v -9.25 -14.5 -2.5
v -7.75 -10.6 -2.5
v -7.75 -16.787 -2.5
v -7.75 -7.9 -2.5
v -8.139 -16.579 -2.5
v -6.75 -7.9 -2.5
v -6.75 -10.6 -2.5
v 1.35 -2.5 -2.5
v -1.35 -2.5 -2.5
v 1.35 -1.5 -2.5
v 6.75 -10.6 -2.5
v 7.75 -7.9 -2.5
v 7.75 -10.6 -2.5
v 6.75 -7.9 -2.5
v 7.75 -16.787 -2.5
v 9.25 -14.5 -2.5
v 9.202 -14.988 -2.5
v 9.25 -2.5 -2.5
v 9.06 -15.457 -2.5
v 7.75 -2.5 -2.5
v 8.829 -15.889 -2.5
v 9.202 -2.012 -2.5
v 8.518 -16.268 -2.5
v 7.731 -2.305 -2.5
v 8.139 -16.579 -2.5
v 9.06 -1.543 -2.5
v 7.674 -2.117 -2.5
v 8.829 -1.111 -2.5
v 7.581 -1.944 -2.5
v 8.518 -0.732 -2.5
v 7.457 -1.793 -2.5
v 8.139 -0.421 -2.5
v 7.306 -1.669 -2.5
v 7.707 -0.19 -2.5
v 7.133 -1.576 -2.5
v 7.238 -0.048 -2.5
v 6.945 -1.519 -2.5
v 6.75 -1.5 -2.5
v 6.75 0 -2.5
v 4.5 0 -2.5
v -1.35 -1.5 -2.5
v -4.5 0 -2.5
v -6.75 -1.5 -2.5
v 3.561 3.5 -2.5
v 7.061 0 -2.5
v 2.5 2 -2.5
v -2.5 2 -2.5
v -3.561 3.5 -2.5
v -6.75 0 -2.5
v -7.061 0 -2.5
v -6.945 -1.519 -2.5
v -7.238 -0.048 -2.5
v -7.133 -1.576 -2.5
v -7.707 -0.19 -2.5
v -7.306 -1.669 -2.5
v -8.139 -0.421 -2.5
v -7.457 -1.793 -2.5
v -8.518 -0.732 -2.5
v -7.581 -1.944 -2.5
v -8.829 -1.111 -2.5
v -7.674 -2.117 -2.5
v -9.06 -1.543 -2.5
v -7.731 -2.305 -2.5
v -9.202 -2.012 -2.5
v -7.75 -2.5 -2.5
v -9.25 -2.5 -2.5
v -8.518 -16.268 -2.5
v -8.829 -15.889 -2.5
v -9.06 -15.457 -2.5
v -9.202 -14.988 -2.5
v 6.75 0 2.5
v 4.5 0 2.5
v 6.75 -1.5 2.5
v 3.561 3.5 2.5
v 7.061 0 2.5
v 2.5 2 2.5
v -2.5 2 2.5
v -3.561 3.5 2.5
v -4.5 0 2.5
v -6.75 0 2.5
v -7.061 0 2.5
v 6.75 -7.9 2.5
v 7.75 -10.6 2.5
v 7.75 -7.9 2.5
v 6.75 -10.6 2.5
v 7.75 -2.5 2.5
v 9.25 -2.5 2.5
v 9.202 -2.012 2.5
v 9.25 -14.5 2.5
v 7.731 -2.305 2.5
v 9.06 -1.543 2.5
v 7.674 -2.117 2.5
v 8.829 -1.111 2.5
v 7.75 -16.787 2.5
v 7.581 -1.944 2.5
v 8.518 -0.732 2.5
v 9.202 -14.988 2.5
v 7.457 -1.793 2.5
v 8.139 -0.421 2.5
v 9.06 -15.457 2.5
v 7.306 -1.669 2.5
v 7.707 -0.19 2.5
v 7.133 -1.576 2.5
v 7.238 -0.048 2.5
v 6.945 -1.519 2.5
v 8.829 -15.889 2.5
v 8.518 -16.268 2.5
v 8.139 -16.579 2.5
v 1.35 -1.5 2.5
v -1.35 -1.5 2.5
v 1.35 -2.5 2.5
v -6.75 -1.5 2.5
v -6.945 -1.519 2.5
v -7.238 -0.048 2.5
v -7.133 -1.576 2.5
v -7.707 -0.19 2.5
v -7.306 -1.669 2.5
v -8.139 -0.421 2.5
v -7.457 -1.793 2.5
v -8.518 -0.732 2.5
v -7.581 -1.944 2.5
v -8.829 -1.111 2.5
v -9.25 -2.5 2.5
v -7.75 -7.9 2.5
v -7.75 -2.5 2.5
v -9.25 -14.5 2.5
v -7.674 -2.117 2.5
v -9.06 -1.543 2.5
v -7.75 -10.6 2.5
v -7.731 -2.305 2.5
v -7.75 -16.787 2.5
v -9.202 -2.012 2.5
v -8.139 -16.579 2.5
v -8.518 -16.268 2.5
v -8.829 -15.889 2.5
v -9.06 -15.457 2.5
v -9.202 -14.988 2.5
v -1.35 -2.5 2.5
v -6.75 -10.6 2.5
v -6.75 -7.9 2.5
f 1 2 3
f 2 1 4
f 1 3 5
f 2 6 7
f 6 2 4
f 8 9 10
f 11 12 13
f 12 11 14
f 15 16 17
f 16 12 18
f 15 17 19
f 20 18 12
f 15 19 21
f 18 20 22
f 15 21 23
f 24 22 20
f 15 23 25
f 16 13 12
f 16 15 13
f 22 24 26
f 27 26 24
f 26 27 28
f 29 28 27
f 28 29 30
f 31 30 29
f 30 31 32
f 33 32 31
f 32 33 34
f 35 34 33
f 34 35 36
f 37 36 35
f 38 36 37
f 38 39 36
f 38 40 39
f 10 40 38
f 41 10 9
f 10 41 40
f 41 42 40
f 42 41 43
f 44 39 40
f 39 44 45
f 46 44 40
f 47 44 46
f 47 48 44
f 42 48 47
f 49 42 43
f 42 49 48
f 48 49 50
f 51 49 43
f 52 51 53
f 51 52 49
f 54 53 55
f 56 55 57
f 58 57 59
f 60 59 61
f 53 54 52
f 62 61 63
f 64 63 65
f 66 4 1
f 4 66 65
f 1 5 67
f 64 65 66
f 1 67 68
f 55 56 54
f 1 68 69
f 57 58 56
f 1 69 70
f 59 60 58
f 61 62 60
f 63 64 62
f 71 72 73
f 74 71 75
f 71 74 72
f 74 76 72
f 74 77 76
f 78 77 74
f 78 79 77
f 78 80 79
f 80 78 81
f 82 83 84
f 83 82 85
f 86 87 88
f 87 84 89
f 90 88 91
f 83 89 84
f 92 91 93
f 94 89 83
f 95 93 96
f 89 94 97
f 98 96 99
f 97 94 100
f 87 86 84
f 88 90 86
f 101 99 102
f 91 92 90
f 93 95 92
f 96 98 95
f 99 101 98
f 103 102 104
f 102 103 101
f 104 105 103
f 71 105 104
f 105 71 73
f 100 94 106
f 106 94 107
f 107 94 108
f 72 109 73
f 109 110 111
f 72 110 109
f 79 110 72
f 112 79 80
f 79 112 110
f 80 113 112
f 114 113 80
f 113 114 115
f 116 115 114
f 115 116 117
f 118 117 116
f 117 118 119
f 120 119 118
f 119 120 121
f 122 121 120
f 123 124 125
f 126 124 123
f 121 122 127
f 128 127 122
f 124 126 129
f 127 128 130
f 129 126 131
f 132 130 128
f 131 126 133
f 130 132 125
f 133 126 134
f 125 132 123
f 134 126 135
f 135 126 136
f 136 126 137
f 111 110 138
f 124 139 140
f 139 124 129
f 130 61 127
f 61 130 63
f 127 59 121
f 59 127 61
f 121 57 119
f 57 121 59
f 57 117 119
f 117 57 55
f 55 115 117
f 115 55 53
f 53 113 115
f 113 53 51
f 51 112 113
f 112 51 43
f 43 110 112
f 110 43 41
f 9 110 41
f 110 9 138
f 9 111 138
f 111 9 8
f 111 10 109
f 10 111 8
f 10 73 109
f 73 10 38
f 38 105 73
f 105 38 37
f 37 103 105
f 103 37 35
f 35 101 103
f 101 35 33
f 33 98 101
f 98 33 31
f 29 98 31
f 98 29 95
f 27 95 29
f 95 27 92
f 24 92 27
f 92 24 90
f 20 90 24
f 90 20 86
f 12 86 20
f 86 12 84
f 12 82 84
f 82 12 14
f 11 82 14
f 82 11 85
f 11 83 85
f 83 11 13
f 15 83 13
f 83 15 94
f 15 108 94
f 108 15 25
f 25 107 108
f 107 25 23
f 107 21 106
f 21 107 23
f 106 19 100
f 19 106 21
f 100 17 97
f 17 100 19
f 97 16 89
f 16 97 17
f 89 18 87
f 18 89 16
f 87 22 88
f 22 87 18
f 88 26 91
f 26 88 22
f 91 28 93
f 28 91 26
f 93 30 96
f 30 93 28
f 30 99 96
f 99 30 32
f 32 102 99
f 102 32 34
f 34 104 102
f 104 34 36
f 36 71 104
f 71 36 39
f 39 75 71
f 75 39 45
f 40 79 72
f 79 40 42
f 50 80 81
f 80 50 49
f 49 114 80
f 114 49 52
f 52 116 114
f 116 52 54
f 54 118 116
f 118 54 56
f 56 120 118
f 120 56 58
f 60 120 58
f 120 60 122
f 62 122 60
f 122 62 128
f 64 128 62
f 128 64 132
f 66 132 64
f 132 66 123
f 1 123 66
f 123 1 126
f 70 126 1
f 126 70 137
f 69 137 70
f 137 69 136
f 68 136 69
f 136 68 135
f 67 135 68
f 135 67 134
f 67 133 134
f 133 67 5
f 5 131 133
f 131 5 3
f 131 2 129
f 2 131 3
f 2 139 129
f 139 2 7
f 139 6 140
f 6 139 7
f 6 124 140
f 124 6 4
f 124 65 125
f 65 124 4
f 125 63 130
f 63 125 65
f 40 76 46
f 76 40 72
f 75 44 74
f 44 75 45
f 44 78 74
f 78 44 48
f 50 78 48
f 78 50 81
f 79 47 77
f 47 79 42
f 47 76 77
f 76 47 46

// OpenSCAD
// file: isosceles_trapezoid.scad
module isosceles_trapezoid(d = 5, angle = 45, h = 1, height = 1) {
	bevel_width = h/tan(angle);
	base_width = d + 2*bevel_width;
	scale_x = base_width/d;

	// turn back into 2D primitive
	projection()
		// turn flat on x plane
		rotate([90, 0, 0])
			// move back into center
			translate([0, 0, -h/2])
				// extrude with scaling into trapezoid
				linear_extrude(height = h, scale=[scale_x, 1])
					square([d, 1], center = true);
}

isosceles_trapezoid();
// file: tie_clip_holder.scad
use <isosceles_trapezoid.scad>;

// derive bevel width from thickness so that actual bevel thickness equals
// thickness
function tie_clip_holder_outer_length(clip_width, angle, thickness) =
	let(bevel_width = sin(angle)*thickness)
	clip_width + 2*bevel_width;

function tie_clip_holder_outer_height(clip_height, thickness) =
	clip_height + thickness;

// allow users to query the base width of the holder so they know what room
// they must make for attaching it somewhere
function tie_clip_holder_base_length(clip_width, clip_height, angle, thickness) =
	let(bevel_width = tie_clip_holder_outer_height(clip_height, thickness)/tan(angle))
	tie_clip_holder_outer_length(clip_width, angle, thickness) + 2*bevel_width;

module tie_clip_holder(holder_width = 5,
		clip_width = 5, clip_height = 2, thickness = 1.5, angle = 45) {
	outer_height = tie_clip_holder_outer_height(clip_height, thickness);

	// move to a zero line in y direction and otherwise in center
	// so we can put it on top of other stuff
	translate([0, outer_height/2, -holder_width/2])
		linear_extrude(holder_width)
			difference() {
				outer_length = tie_clip_holder_outer_length(clip_width,
					angle, thickness);

				// beveled for more technical look and better
				// overhang printing
				isosceles_trapezoid(d = outer_length, h = outer_height,
					angle = angle);
				translate([0, -thickness/2, 0])
					isosceles_trapezoid(d = clip_width,
						h = clip_height, angle = angle);

			}
}

tie_clip_holder();
// file: openbeam_clip.scad
$fn = 32;

module rounded_rectangle(width = 1, height = 1, rounding = 0) {
	if (rounding > 0) {
		non_rounded_width = width - 2*rounding;
		non_rounded_height = height - 2*rounding;

		// correct for funky minkowski displacement
		translate([-non_rounded_width/2, -non_rounded_height/2])
			minkowski() {
				square([non_rounded_width, non_rounded_height], center = true);
				translate([non_rounded_width/2, non_rounded_height/2, 0])
					circle(rounding, center = true);
			}
	} else {
		// minkowski doesn't work properly on circle with diameter 0
		square([width, height], center = true);
	}
}

function openbeam_clip_outer_width(beam_width, thickness) =
	beam_width + 2*thickness;

module openbeam_clip_cross(beam_width, rounding, thickness) {
	difference() {
		outer_width = openbeam_clip_outer_width(beam_width = beam_width,
			thickness = thickness);

		// since clip is open at the bottom, remove one thickness and
		// move down by half of that to be back in center
		translate([0, thickness/2, 0])
			rounded_rectangle(width = outer_width,
				height = outer_width - thickness,
				rounding = rounding + thickness);

		// make inner rectangle higher than outer by one thickness
		// (to be on the safe side) and shift down by
		// half of that to be centered with the outer again
		translate([0, -thickness/2, 0])
			rounded_rectangle(width = beam_width,
				height = beam_width + thickness,
				rounding = rounding);
	}
}

module openbeam_clip_stay(slot_width = 3.2, protrusion = 0.75) {
	square([slot_width, protrusion], center = true);
}

module openbeam_clip(beam_width = 15, height = 15,
		beam_slot_width = 3.2, stay_protrusion = 1,
		rounding = 1, thickness = 1.5,
		epsilon = 0.25) {
	cbw = beam_width + 2*epsilon;
	outer_width = openbeam_clip_outer_width(beam_width = cbw, thickness = thickness);

	// move back into center after extrude but put top onto y as base-line
	// for attaching things to it
	translate([0, -outer_width/2, -height/2])
		linear_extrude(height)
			union() {
				openbeam_clip_cross(beam_width = cbw,
					rounding = rounding,
					thickness = thickness);

				// add in the stays
				stay_position = cbw/2 - stay_protrusion/2;
				cbsw = beam_slot_width - 2*epsilon;
				for (stay_angle =[-90:90:90])
					rotate([0, 0, stay_angle])
						translate([0, stay_position, 0])
						openbeam_clip_stay(slot_width = cbsw,
							protrusion = stay_protrusion);
			}
}

openbeam_clip();
// main file
$fn = 32;
use <openbeam_clip.scad>;
use <tie_clip_holder.scad>;

module openbeam_tie_clip_clip(beam_width = 15, height = 5,
		tie_clip_width = 5, tie_clip_height = 2,
		thickness = 1.5, epsilon = 0.25) {
	union() {
		openbeam_clip(beam_width = beam_width,
			height = height,
			thickness = thickness,
			epsilon = 0.25);

		tie_clip_holder(clip_width = tie_clip_width,
			clip_height = tie_clip_height,
			holder_width = height,
			thickness = thickness);
	}
}

openbeam_tie_clip_clip();
